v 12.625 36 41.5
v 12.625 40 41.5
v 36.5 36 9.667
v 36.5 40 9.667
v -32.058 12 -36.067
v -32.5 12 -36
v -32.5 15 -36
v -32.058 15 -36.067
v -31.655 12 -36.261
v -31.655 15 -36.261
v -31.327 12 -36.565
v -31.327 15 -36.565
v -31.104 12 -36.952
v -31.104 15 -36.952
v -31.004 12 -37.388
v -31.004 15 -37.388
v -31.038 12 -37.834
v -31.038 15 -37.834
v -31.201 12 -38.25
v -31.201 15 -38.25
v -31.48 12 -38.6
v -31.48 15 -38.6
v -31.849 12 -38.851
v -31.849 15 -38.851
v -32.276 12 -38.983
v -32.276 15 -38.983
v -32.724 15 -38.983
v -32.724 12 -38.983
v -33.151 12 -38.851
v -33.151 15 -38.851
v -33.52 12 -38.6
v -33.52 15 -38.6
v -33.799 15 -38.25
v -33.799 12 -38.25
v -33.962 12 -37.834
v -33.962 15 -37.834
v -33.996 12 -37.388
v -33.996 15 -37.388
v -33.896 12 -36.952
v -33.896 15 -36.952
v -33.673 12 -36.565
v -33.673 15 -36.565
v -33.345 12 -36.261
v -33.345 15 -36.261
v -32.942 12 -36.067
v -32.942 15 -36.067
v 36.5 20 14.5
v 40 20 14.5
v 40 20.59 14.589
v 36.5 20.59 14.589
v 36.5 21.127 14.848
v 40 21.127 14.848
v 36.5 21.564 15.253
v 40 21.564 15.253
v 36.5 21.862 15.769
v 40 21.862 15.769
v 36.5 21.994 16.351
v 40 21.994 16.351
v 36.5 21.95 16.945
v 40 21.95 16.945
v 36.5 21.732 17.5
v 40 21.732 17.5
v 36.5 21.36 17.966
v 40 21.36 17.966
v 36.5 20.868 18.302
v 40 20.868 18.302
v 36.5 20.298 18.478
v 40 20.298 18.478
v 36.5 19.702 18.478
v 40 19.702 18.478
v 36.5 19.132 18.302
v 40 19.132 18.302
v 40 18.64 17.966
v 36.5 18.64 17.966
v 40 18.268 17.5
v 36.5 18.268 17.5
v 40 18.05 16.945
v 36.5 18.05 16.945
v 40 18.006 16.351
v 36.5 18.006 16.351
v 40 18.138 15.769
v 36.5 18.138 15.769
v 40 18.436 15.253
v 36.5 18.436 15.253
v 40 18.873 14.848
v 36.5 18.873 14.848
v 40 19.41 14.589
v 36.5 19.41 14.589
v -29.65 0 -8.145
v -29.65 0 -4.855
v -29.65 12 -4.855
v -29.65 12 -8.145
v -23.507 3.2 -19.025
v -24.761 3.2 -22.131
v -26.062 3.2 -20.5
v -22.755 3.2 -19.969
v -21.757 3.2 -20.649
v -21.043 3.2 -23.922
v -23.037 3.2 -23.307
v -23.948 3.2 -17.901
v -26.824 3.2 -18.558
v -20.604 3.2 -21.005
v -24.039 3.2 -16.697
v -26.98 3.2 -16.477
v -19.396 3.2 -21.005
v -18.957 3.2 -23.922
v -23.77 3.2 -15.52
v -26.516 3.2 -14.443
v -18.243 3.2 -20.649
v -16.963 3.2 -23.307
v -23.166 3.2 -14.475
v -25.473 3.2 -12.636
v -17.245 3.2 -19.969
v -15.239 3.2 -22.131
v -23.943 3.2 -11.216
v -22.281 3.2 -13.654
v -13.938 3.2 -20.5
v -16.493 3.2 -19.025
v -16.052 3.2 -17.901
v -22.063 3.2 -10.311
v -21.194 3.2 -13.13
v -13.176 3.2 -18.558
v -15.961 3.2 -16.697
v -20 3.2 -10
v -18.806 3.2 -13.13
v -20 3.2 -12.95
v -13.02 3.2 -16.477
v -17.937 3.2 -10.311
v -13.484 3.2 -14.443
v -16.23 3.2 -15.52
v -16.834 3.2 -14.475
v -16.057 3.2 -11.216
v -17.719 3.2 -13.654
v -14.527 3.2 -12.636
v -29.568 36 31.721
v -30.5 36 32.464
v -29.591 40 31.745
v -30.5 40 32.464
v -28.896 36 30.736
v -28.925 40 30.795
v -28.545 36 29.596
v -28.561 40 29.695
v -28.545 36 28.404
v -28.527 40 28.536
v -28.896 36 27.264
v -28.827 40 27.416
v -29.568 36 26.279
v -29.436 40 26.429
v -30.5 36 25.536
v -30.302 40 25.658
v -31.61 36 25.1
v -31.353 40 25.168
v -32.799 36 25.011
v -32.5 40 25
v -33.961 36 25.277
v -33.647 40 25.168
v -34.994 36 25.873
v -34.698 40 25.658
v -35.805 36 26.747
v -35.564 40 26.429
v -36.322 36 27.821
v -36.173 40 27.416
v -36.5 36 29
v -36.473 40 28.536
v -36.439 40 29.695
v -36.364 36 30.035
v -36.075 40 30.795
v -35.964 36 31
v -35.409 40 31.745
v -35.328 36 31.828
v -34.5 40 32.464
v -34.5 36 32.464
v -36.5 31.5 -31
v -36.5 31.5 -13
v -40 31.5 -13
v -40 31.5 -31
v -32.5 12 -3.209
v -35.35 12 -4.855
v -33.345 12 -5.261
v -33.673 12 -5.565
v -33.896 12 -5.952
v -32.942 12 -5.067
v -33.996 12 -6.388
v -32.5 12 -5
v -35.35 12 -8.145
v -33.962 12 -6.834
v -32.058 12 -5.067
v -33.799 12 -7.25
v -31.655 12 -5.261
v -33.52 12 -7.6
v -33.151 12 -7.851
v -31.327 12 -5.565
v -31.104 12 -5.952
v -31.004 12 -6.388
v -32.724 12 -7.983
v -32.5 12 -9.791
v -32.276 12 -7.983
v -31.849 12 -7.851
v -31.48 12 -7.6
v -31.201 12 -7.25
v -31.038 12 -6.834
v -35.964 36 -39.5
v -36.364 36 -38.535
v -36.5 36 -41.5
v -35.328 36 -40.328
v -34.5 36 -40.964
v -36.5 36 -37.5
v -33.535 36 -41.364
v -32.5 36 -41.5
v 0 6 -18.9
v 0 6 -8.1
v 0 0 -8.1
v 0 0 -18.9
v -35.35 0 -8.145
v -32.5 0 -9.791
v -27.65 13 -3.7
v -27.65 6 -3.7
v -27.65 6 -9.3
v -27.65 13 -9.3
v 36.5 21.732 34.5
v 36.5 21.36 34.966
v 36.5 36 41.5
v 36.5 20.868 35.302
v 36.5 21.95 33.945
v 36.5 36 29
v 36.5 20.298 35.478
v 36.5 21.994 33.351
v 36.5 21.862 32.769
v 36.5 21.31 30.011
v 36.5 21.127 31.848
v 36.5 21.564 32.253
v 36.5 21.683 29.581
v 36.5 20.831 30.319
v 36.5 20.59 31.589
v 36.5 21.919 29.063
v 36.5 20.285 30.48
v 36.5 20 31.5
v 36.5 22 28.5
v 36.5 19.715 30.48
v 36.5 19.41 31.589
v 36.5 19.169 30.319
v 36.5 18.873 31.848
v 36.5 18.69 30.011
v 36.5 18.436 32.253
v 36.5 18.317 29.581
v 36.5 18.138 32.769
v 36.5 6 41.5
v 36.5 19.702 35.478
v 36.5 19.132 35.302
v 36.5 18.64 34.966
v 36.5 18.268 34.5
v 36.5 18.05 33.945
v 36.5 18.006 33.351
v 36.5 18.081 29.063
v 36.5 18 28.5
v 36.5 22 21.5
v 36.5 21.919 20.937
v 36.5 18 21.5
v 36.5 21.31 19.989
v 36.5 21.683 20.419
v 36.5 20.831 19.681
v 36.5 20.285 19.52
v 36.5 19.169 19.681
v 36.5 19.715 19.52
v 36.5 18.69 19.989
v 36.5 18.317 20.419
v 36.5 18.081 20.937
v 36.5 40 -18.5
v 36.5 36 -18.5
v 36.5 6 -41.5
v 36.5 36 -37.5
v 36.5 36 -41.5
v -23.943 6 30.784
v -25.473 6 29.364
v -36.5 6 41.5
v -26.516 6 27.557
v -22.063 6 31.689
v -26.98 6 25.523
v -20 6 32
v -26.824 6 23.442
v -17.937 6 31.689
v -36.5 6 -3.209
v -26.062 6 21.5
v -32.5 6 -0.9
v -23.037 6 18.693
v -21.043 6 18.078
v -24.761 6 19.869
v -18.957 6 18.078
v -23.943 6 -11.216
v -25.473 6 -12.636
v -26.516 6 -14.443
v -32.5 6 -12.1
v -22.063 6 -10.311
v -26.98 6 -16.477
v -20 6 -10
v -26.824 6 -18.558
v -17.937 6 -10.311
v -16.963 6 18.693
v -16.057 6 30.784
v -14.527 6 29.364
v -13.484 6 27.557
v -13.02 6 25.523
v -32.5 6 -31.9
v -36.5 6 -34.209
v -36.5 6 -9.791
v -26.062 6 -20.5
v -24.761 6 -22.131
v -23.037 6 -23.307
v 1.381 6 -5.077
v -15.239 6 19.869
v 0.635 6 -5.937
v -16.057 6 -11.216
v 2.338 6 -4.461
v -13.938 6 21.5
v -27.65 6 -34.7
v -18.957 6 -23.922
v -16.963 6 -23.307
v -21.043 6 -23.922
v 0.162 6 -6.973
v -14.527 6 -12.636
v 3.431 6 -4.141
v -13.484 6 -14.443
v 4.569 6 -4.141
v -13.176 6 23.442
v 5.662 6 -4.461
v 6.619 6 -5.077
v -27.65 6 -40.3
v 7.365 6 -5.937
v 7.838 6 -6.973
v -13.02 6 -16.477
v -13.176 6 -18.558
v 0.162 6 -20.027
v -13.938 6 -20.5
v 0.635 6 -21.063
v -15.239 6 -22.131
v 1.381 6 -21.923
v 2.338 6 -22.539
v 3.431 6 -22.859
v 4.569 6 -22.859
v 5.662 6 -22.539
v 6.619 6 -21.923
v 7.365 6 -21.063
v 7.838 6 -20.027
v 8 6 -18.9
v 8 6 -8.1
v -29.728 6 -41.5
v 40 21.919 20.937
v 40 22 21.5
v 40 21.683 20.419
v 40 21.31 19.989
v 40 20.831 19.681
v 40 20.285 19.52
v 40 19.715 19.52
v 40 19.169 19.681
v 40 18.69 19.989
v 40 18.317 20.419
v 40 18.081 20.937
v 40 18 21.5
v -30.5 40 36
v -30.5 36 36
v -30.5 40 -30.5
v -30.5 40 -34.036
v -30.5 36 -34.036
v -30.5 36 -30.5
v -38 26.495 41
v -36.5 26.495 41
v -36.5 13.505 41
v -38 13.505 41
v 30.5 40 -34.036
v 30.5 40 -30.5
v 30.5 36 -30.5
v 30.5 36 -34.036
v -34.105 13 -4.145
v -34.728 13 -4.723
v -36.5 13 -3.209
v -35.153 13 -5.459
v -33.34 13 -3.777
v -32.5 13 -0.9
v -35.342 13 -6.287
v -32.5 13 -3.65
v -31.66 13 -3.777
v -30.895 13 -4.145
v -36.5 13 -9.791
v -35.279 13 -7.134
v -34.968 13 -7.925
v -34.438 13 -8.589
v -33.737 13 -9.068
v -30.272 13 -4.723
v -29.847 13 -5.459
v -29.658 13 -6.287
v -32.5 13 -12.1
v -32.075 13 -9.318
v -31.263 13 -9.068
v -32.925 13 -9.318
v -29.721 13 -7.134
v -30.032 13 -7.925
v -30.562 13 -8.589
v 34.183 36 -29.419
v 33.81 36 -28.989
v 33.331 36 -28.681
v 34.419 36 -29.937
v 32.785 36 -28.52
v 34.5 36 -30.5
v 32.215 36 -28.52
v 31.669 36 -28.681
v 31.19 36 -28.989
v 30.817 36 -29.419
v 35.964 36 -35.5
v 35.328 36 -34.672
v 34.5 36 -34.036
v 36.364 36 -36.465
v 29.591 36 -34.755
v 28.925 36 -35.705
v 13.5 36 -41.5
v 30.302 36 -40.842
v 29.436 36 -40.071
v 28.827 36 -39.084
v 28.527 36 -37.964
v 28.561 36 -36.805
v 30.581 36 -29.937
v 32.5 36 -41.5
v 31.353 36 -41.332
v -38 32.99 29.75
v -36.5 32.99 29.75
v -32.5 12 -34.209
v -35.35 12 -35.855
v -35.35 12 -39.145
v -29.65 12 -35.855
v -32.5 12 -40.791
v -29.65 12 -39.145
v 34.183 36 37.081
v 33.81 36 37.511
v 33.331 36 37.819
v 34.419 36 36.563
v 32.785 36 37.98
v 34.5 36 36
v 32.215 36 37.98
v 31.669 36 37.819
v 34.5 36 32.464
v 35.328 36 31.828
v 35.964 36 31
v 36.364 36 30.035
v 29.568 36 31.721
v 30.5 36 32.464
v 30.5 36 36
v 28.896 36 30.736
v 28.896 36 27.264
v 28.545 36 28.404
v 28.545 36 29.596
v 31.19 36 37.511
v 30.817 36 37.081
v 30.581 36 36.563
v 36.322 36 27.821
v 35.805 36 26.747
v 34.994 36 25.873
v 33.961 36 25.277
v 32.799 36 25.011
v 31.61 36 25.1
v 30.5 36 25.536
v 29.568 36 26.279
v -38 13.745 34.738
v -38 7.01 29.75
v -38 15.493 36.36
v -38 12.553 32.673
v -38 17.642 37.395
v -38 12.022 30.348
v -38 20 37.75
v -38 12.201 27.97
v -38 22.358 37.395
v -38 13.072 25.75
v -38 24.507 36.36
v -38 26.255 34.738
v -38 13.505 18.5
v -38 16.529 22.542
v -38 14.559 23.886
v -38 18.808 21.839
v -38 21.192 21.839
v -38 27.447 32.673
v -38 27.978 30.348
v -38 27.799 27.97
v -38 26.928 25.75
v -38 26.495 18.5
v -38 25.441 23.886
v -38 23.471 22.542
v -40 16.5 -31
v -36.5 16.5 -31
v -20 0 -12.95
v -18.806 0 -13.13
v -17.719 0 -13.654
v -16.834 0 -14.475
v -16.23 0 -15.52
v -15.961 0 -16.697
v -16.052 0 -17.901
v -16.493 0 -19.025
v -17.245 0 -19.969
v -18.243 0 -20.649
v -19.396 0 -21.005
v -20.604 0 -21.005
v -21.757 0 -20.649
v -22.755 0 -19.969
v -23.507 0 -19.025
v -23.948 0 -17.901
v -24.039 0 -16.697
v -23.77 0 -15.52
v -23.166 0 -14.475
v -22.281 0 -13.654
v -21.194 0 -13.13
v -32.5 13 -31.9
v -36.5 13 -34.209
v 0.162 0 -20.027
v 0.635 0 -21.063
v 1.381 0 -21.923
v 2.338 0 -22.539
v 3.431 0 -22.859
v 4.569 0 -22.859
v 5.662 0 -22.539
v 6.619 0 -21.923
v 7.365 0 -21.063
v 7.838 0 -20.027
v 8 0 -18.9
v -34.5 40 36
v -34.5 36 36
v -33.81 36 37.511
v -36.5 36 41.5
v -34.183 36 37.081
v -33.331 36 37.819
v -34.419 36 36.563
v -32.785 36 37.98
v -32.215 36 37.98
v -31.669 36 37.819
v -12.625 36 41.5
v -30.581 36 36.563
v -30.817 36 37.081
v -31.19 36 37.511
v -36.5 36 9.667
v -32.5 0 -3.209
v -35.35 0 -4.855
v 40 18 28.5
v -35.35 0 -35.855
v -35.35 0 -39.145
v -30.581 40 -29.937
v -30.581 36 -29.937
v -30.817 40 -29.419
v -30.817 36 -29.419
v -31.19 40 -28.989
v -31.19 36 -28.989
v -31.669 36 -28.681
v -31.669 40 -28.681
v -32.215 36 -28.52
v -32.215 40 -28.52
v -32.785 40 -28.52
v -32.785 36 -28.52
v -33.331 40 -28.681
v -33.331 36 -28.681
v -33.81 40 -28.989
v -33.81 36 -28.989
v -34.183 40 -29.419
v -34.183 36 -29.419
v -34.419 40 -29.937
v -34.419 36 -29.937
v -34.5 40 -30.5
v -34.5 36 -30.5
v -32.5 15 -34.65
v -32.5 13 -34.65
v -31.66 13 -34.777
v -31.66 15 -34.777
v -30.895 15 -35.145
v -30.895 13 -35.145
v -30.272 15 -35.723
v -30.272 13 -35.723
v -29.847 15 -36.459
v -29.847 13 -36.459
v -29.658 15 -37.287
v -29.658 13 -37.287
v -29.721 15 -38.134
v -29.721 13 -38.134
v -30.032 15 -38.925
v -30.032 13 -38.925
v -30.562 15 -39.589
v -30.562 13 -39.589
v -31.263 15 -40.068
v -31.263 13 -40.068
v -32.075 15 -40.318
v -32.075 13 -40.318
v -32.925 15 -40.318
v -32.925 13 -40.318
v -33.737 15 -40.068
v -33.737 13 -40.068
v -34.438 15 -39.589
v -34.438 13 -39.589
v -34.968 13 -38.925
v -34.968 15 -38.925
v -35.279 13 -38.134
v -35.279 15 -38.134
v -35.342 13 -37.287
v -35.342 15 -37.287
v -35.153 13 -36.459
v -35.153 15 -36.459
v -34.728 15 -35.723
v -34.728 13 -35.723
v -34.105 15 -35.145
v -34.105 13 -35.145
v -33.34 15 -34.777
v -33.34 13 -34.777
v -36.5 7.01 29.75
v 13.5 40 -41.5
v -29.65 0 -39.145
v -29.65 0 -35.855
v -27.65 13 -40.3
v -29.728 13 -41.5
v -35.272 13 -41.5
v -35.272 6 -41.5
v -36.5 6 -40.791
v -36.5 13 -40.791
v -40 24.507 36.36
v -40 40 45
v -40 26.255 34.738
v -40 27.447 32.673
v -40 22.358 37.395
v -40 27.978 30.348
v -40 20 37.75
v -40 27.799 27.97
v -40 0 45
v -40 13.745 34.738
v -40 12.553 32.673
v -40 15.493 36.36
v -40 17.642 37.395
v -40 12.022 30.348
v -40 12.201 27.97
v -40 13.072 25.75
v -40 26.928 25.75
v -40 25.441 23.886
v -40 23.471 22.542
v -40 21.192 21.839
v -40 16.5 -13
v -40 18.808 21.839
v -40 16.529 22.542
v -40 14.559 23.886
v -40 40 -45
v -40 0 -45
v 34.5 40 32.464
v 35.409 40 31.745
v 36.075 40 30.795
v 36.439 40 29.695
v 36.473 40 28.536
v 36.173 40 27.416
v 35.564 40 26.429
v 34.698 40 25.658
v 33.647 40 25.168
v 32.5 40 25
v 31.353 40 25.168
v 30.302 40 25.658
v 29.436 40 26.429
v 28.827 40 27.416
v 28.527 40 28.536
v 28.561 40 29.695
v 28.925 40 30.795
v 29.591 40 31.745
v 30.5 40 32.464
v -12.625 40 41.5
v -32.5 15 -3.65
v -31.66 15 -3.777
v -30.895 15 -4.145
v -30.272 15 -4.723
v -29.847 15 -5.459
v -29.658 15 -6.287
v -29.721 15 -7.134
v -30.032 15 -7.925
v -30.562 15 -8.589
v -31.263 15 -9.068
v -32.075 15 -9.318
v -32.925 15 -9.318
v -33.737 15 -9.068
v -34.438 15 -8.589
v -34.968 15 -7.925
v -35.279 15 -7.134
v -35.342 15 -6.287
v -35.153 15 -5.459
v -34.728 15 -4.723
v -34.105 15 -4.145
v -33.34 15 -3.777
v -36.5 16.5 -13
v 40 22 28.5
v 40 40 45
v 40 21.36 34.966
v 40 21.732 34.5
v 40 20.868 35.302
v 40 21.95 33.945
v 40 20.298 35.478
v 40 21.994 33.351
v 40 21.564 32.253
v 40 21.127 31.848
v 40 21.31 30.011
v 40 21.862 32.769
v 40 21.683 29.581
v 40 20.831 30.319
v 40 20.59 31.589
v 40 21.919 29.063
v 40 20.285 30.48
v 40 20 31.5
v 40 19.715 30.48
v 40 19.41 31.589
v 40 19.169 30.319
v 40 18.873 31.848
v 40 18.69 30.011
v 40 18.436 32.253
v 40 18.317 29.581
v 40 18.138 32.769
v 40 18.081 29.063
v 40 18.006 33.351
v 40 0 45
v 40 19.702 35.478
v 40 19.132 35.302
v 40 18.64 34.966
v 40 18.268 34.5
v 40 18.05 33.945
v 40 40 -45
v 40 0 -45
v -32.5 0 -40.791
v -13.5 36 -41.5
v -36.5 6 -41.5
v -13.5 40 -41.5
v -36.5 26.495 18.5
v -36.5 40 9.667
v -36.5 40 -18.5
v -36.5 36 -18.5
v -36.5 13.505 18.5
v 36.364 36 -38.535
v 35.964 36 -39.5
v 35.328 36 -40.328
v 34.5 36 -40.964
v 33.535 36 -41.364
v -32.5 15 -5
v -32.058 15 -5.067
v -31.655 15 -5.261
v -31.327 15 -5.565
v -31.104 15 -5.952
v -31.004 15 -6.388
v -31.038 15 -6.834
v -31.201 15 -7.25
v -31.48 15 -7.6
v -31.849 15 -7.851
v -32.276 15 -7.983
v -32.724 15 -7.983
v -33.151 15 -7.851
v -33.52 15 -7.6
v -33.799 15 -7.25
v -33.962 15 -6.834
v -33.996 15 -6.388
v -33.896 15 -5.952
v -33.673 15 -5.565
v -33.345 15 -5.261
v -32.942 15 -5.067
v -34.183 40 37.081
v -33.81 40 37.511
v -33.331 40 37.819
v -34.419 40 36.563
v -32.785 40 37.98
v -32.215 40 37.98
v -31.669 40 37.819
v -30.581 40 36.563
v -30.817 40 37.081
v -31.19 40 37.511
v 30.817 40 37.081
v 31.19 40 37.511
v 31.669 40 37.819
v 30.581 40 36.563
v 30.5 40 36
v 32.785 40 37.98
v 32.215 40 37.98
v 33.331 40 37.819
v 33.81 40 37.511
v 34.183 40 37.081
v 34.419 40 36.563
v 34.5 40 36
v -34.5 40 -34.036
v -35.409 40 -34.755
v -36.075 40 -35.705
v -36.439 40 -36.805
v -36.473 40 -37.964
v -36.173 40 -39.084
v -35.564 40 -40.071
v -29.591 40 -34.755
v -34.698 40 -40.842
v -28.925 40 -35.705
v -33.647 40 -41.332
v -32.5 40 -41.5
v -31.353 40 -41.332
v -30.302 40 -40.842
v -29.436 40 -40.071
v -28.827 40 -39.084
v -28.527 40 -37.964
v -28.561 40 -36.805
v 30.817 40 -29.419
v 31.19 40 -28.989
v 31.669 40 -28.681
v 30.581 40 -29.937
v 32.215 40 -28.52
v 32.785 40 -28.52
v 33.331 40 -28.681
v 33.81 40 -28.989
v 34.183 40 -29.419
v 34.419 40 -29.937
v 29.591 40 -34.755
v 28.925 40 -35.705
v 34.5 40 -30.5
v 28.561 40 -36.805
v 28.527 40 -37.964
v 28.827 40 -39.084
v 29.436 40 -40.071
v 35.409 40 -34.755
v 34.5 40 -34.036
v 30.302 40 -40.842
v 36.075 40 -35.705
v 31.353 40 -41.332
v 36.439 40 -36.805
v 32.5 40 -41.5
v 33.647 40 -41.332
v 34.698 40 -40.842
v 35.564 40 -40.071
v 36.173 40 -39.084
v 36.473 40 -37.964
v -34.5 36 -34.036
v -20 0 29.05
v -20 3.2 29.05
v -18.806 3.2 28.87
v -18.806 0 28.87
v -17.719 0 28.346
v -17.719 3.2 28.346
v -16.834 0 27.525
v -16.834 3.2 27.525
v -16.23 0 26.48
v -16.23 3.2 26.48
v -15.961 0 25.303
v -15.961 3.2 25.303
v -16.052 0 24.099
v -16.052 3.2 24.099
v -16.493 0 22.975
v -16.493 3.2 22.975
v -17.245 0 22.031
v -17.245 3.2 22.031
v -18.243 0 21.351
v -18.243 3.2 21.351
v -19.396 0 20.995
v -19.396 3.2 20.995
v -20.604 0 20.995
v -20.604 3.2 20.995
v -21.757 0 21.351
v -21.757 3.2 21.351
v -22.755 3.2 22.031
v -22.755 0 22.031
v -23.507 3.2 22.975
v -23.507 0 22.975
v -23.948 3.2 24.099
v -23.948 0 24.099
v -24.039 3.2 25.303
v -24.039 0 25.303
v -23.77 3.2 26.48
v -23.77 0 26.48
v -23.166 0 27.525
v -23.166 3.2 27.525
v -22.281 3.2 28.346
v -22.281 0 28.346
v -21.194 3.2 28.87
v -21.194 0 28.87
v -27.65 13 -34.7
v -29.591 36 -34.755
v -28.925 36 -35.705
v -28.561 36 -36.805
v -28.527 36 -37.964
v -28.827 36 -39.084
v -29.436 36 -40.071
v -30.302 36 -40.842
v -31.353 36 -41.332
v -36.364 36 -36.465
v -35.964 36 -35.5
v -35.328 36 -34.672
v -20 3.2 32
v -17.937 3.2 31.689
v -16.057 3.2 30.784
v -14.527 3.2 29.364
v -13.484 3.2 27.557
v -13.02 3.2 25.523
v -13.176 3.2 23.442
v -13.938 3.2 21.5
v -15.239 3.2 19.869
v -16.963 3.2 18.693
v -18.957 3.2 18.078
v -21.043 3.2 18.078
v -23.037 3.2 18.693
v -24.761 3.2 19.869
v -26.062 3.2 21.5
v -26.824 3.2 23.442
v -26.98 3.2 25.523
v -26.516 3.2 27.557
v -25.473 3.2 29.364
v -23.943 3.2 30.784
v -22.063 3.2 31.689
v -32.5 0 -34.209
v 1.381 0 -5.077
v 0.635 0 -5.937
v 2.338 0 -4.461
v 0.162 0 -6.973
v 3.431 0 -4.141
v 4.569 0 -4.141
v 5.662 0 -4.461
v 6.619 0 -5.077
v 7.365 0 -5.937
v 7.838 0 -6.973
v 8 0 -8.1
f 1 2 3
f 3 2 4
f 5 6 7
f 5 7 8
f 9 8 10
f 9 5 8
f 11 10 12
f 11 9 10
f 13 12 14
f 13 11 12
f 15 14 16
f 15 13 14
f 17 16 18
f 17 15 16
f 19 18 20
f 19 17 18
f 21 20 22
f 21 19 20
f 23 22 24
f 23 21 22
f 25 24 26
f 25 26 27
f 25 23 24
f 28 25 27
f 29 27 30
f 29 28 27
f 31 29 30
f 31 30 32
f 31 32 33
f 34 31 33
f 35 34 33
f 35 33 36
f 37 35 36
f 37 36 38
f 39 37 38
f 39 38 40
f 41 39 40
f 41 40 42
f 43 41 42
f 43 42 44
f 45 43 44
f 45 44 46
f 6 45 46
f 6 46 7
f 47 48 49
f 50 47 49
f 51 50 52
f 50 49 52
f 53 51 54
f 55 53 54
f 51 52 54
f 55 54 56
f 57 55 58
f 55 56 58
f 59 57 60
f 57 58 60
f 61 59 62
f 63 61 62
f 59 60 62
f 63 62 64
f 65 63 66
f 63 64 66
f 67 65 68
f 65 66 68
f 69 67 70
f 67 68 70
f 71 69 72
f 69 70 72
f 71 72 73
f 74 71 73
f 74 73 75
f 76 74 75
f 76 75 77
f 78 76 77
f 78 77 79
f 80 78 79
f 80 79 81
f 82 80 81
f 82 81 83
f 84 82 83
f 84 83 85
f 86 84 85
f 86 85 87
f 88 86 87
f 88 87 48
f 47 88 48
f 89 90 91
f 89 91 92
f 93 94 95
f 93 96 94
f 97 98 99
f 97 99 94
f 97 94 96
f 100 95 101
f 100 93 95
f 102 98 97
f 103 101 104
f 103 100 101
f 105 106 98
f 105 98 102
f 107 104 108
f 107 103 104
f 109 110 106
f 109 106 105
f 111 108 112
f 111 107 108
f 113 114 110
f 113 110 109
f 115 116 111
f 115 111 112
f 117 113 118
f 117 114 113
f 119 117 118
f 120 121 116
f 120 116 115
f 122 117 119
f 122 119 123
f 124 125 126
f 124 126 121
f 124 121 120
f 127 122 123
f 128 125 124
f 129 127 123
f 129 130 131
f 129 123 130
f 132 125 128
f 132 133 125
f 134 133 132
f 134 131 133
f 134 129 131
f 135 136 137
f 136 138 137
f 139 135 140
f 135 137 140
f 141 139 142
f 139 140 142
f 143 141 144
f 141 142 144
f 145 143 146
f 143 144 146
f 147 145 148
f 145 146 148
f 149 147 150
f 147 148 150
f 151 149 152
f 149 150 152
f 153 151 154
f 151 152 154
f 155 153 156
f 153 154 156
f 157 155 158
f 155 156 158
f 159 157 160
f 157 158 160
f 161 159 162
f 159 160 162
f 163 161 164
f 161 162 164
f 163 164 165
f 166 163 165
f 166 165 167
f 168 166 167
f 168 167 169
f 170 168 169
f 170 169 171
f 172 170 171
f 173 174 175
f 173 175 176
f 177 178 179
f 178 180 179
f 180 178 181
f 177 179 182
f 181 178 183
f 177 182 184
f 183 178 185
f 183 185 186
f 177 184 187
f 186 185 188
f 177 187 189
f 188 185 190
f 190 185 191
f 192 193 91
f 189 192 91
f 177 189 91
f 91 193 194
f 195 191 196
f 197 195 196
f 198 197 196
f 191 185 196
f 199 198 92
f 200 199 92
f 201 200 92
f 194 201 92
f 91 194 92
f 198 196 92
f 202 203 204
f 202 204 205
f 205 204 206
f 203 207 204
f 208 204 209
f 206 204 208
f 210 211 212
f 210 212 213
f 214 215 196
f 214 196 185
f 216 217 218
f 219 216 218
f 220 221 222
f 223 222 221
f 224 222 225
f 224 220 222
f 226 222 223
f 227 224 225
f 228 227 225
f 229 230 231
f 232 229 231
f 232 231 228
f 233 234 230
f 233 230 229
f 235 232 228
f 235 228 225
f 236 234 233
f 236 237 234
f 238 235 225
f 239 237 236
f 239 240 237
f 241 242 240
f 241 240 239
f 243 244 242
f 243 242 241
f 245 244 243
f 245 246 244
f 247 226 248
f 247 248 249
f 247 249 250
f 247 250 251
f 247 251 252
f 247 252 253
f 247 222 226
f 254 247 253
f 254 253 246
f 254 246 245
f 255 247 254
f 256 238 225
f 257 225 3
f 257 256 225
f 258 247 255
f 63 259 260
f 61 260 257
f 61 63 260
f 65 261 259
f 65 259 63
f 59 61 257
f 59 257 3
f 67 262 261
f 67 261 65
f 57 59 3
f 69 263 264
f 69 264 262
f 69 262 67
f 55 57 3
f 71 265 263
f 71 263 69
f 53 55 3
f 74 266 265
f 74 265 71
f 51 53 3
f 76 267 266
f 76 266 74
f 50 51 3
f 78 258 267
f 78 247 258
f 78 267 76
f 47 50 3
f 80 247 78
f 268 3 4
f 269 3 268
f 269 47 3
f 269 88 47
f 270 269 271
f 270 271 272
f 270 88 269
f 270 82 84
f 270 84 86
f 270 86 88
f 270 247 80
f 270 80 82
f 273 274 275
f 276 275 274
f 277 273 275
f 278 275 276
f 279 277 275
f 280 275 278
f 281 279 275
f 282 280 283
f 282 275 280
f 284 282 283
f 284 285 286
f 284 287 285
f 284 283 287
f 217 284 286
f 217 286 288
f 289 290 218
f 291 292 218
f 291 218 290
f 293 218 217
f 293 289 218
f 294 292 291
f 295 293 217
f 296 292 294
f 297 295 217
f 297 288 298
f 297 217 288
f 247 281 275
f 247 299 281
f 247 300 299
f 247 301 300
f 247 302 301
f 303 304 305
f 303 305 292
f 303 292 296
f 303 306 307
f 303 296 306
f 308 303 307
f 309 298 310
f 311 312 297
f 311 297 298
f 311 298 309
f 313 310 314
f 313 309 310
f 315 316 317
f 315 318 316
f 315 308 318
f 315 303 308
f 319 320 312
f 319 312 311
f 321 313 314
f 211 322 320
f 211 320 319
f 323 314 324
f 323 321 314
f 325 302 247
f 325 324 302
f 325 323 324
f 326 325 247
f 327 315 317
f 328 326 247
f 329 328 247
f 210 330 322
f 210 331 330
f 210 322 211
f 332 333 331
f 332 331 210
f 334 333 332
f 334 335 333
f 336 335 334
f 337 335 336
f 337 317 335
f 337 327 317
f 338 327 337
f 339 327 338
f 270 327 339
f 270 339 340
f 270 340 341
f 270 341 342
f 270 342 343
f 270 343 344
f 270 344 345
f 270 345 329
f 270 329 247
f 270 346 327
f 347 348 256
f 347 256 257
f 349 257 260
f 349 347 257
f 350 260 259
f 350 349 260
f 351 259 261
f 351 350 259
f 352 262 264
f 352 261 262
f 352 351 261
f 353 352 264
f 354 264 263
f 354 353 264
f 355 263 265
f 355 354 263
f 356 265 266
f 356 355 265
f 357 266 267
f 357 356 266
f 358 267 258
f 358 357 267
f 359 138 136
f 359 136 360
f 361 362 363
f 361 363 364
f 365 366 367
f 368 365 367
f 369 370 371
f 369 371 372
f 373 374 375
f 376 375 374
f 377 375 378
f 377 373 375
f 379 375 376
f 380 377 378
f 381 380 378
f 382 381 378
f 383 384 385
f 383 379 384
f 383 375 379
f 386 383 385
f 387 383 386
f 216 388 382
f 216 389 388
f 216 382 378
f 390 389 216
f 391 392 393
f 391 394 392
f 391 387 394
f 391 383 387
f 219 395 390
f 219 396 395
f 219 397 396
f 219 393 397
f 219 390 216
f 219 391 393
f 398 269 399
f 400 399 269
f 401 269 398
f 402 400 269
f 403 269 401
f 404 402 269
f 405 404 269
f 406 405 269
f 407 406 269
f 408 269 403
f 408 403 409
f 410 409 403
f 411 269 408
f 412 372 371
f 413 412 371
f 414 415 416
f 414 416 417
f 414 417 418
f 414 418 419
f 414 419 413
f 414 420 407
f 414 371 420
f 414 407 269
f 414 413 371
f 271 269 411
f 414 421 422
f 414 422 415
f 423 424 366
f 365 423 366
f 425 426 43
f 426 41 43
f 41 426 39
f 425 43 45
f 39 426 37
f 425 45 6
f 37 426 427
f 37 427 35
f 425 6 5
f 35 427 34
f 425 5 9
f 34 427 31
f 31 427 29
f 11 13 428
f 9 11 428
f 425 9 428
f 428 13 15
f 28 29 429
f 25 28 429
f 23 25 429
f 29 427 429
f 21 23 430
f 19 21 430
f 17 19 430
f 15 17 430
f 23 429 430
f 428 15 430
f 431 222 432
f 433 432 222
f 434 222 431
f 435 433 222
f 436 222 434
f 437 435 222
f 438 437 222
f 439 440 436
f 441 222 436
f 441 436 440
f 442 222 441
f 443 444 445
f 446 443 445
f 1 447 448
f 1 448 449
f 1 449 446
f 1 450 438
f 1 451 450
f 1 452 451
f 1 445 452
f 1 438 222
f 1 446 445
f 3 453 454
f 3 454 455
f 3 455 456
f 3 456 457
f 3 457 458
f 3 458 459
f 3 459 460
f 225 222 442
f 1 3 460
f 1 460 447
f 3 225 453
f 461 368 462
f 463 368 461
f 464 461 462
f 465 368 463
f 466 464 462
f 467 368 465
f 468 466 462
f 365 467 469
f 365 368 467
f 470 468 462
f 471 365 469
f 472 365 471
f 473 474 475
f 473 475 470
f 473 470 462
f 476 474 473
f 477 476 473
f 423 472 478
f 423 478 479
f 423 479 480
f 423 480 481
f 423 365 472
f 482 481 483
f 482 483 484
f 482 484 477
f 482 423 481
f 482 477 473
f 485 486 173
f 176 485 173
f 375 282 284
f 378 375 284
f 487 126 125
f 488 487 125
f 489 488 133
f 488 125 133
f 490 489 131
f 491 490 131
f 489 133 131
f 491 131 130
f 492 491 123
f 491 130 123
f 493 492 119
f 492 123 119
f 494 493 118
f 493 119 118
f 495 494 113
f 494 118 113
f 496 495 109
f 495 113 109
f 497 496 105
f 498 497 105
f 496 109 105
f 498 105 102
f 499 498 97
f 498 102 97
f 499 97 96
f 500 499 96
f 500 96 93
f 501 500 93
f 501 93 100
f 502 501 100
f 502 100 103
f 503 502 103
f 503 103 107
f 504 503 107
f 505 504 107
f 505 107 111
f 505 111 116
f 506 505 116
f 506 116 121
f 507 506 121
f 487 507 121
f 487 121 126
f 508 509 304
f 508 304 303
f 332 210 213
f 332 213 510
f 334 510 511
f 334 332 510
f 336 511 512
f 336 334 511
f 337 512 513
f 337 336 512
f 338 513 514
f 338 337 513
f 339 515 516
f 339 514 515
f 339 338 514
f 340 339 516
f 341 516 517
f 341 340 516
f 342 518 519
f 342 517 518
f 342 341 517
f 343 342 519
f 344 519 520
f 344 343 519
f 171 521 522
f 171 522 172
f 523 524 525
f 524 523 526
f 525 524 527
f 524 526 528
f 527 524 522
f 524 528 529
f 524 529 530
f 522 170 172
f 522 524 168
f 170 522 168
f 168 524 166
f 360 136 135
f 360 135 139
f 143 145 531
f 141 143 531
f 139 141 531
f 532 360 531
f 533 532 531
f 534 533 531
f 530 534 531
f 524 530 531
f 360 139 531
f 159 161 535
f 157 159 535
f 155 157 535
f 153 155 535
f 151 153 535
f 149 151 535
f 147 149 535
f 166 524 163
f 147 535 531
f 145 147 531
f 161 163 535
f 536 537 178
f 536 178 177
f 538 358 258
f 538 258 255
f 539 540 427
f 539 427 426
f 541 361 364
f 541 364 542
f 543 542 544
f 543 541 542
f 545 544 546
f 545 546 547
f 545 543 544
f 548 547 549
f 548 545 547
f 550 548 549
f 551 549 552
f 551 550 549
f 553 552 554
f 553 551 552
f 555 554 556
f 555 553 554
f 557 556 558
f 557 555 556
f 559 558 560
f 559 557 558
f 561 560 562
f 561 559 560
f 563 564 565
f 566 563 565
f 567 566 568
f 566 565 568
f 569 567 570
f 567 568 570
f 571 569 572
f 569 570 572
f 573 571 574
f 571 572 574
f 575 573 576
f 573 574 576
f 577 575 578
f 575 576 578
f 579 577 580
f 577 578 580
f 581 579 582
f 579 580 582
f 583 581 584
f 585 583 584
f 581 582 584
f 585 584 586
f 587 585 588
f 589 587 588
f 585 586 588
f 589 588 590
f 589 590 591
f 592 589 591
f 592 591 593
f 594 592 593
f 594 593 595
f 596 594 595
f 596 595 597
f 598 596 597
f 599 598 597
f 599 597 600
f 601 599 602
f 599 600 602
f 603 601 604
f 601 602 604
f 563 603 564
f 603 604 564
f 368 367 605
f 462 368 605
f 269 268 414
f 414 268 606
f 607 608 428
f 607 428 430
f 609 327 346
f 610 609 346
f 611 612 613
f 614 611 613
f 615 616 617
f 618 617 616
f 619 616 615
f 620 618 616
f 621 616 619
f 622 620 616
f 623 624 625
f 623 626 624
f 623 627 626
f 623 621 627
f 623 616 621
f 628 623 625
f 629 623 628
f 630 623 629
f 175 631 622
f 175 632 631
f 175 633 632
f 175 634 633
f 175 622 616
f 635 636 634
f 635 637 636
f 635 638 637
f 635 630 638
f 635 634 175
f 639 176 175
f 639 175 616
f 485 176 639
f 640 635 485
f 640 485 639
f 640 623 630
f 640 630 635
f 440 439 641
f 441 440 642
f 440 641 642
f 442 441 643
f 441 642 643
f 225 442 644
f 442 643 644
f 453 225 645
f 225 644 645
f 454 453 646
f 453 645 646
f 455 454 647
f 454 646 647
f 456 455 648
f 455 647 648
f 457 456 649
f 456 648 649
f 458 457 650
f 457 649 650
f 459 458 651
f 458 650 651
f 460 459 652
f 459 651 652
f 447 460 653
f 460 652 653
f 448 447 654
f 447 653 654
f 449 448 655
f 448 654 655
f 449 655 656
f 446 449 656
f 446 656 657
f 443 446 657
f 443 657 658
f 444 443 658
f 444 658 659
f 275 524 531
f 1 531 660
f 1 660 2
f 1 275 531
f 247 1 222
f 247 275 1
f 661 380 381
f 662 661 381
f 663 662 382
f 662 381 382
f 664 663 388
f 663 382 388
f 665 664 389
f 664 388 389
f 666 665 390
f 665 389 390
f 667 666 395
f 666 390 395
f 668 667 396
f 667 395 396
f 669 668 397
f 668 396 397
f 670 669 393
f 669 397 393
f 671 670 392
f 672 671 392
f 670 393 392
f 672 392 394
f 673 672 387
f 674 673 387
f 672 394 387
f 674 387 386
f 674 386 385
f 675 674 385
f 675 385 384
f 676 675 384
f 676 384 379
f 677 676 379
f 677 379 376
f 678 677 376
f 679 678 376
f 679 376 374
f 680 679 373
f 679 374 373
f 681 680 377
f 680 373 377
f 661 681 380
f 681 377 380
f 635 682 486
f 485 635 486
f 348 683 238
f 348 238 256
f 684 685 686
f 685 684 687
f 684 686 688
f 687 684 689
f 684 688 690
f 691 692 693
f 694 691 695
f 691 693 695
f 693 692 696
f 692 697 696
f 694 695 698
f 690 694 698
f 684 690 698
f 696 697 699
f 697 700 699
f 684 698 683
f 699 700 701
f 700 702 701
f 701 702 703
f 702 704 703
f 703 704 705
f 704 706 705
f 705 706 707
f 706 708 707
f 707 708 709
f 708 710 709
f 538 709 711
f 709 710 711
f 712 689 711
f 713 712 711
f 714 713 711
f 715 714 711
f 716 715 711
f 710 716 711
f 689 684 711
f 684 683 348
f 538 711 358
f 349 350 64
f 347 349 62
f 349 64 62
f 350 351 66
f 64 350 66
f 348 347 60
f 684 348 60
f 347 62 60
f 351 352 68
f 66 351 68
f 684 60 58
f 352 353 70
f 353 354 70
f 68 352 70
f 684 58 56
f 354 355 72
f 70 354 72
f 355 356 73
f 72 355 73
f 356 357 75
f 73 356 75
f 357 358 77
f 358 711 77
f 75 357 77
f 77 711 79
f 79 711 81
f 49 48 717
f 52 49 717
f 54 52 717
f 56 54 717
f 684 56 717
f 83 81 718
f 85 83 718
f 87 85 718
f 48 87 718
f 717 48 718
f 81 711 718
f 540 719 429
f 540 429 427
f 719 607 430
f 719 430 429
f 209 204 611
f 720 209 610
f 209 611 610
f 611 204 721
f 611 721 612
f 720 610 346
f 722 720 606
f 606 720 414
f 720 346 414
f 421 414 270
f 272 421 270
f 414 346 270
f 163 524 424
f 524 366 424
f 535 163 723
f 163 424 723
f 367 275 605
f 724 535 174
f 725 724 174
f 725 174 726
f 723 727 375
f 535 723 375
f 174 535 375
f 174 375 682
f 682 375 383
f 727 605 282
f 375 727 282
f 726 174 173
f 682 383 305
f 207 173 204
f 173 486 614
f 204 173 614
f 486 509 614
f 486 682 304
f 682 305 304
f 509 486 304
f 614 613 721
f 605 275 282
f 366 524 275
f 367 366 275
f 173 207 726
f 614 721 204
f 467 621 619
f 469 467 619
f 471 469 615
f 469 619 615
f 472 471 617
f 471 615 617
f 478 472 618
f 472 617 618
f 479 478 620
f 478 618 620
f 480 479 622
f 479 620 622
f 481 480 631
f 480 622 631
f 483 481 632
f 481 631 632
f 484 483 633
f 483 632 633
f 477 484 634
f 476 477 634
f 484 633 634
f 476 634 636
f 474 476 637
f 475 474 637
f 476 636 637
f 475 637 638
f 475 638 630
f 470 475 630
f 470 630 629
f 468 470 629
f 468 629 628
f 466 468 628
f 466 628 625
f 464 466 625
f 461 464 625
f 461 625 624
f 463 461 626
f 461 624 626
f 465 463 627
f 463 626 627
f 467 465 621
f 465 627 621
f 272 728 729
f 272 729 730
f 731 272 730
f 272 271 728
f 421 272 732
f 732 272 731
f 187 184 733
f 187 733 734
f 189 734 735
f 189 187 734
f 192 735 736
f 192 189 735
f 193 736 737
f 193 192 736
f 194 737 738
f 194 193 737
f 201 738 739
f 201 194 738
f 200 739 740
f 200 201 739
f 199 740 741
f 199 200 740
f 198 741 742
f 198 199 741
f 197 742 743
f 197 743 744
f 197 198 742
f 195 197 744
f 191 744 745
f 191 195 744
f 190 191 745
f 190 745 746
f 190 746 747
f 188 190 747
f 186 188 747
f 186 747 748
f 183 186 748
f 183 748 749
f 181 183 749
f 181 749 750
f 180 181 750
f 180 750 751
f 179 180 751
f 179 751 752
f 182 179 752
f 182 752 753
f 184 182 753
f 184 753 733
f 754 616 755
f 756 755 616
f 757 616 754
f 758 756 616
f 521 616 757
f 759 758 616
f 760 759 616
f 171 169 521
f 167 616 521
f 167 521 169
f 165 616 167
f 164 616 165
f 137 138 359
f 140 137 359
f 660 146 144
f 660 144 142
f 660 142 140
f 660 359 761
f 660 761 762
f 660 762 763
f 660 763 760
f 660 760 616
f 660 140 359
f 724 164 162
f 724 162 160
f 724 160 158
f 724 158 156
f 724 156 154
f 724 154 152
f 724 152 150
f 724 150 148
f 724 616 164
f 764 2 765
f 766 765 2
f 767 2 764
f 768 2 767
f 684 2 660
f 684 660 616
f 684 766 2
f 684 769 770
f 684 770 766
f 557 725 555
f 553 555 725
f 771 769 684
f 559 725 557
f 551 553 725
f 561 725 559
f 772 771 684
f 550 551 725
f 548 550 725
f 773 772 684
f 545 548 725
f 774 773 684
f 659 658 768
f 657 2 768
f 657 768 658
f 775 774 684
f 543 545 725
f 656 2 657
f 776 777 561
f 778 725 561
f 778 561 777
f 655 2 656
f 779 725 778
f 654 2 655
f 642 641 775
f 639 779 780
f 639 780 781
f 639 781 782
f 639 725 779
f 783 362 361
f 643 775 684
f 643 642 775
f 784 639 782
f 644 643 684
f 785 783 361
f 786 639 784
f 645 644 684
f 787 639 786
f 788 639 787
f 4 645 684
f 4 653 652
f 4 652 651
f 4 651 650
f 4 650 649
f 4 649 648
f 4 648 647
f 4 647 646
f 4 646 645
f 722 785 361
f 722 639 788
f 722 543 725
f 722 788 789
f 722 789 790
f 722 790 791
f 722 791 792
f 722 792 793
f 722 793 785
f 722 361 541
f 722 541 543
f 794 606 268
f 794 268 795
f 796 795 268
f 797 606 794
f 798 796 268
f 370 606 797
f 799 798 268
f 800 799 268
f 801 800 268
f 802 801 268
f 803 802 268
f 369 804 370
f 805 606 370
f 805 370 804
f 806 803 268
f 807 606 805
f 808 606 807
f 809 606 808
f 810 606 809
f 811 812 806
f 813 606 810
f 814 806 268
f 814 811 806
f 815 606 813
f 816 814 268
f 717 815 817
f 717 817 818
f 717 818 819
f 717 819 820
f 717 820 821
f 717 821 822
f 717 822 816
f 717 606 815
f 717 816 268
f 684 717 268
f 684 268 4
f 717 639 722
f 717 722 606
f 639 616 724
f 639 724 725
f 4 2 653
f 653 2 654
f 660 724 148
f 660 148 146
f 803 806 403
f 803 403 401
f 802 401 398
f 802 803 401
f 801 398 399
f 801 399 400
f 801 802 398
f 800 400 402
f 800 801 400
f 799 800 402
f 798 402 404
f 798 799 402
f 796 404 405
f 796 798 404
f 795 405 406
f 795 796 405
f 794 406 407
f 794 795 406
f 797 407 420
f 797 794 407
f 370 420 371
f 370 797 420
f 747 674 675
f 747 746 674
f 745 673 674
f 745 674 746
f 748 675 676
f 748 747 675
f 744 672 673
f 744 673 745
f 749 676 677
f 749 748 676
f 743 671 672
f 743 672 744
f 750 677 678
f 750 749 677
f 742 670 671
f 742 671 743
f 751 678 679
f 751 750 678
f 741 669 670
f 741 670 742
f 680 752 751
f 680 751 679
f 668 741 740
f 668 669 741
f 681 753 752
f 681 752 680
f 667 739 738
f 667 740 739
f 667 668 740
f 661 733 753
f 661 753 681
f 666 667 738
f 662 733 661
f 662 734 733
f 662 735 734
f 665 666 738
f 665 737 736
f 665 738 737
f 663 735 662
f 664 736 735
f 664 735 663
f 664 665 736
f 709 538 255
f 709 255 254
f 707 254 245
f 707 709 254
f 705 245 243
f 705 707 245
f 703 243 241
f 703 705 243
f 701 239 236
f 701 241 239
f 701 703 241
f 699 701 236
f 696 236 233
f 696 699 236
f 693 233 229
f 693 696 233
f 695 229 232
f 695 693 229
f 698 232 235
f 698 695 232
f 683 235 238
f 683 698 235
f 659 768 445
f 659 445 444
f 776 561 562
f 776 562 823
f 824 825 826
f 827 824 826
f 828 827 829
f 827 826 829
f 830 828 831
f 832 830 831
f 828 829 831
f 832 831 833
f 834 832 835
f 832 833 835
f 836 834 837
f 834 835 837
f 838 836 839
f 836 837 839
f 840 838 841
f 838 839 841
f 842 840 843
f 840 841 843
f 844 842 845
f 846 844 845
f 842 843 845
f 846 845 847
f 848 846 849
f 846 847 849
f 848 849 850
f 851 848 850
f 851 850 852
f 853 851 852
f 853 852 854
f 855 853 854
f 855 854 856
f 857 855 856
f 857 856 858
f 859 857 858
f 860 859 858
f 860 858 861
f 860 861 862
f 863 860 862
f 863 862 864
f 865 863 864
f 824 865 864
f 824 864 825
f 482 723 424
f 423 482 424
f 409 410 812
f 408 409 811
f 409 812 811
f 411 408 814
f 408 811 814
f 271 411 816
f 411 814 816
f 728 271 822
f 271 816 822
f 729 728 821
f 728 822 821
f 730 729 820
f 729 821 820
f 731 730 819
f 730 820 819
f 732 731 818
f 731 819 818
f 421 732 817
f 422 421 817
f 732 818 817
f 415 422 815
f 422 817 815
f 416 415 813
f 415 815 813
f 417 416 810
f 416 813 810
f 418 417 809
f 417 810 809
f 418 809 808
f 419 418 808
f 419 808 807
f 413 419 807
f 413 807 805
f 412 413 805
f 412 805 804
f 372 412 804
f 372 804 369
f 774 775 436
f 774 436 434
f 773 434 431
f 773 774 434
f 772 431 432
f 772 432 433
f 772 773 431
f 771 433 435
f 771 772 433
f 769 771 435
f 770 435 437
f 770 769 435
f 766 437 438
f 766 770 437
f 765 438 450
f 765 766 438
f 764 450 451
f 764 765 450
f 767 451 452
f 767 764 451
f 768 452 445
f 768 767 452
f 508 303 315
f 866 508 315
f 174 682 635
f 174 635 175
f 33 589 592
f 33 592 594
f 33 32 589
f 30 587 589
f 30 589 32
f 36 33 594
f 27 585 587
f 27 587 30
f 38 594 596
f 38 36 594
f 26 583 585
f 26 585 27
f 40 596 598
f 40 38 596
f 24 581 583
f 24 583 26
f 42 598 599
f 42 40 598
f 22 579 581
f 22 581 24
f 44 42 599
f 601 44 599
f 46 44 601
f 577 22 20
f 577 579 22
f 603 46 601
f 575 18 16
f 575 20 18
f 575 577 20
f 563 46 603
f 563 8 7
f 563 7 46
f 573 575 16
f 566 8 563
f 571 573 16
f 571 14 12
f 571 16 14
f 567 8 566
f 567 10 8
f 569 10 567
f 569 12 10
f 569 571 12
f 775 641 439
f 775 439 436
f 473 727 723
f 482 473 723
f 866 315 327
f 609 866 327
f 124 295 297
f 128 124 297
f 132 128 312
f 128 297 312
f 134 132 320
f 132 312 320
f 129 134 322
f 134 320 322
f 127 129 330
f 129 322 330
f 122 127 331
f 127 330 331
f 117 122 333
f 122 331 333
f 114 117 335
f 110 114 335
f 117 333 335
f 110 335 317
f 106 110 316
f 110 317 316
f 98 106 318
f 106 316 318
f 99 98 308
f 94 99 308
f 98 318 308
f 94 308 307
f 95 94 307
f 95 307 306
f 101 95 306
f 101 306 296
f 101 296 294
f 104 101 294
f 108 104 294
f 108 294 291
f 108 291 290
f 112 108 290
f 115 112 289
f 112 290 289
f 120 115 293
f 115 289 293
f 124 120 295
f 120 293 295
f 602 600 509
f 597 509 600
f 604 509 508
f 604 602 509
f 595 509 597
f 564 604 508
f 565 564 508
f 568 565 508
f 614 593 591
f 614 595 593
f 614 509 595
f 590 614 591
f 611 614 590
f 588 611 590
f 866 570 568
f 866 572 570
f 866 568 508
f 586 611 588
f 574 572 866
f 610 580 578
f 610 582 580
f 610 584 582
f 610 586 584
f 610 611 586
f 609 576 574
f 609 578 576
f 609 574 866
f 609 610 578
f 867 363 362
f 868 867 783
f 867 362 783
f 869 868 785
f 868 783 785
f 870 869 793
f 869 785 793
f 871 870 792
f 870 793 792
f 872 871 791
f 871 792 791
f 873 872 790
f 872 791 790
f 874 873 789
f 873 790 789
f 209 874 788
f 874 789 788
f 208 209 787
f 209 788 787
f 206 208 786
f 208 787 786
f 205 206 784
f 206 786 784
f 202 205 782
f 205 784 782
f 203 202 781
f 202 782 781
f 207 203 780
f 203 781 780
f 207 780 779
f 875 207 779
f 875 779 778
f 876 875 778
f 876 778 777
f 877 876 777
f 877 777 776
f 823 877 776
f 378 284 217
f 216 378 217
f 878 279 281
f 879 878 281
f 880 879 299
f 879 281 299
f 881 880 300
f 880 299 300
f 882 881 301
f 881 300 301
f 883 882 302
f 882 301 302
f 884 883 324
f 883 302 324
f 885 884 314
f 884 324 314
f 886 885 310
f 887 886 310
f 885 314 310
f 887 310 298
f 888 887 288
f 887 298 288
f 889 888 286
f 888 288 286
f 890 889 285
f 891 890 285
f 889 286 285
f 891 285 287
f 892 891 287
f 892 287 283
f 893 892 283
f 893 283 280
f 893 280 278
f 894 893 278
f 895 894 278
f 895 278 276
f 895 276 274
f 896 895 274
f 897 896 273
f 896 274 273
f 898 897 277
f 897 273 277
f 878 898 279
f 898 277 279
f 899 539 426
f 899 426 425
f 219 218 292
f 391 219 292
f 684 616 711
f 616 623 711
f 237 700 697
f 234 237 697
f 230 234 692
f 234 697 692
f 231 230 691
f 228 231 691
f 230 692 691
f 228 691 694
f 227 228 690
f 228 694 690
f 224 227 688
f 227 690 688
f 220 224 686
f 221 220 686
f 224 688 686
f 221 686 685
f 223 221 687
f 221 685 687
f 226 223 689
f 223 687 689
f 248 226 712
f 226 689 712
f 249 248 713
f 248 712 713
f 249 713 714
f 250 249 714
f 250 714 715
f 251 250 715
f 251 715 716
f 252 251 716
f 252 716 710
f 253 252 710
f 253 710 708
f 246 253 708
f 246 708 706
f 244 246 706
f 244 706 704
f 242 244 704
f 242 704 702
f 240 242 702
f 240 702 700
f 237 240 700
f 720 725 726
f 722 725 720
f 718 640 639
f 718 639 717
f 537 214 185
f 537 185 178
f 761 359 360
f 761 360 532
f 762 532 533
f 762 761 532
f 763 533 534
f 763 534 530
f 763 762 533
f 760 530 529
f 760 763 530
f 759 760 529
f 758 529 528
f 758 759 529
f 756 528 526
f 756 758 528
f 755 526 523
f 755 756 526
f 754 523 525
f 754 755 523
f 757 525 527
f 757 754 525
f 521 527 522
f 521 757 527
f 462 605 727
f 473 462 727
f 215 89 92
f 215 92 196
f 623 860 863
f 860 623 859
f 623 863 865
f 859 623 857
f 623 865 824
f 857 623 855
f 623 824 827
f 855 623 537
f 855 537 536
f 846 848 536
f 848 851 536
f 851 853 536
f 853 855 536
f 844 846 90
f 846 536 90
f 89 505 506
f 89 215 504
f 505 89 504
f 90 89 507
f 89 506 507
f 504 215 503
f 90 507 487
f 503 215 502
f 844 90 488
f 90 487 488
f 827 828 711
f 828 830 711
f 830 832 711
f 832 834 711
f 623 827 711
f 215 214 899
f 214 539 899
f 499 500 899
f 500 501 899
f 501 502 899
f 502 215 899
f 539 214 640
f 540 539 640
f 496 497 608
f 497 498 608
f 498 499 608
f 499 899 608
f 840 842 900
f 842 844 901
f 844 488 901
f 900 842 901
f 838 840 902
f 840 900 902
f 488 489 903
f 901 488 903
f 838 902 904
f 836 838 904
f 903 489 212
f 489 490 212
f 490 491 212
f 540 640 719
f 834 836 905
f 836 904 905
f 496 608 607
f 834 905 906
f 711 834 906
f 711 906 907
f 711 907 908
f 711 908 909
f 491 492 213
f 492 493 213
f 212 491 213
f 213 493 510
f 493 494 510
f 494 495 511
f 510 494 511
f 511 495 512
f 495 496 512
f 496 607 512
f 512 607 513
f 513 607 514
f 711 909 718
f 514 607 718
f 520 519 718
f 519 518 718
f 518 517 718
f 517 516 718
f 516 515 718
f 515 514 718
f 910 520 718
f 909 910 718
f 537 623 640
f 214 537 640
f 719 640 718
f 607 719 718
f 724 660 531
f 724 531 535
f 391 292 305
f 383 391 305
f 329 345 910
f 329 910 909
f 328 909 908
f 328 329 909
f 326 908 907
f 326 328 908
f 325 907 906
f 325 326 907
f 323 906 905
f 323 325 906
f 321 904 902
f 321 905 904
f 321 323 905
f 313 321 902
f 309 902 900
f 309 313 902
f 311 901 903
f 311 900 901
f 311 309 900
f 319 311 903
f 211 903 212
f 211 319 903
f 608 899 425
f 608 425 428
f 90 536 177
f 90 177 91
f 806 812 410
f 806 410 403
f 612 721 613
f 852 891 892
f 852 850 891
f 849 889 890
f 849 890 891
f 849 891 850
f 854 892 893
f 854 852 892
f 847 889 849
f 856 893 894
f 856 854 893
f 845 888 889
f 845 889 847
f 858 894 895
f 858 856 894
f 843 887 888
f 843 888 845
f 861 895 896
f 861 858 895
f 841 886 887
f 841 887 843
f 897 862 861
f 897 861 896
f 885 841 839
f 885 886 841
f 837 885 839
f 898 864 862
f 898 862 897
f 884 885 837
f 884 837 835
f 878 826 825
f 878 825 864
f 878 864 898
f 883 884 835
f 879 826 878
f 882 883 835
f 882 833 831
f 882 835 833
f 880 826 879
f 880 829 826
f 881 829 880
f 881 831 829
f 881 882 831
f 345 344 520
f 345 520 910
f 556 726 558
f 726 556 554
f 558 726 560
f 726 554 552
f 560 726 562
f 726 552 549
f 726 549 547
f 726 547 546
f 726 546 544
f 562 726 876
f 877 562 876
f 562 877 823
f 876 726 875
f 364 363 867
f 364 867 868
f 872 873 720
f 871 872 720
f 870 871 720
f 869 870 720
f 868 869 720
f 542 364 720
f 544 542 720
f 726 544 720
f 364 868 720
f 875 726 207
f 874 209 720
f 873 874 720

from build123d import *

# Parameters (mm, degrees)
SKETCH1_W               = 80
SKETCH1_H               = 90
BOSS_EXTRUDE1_DEPTH     = 6
SKETCH4_W               = 80
SKETCH4_H               = 90
SKETCH4_W_2             = 73
SKETCH4_H_2             = 83
BOSS_EXTRUDE2_DEPTH     = 34
SKETCH6_R               = 4.05
CUT_EXTRUDE1_DEPTH      = 40
SKETCH7_R               = 7
CUT_EXTRUDE2_DEPTH      = 2.8
BOSS_EXTRUDE3_DEPTH     = 7
SKETCH11_R              = 2.85
BOSS_EXTRUDE4_DEPTH     = 2
CUT_EXTRUDE3_DEPTH      = 9
CUT_EXTRUDE3_DEPTH_BACK = 6
SKETCH5_R               = 1.5
CUT_EXTRUDE4_DEPTH      = 6
CUT_EXTRUDE4_DEPTH_BACK = 70.144775652
SKETCH12_W              = 18
SKETCH12_H              = 15
CUT_EXTRUDE6_DEPTH      = 3.5
SKETCH17_R              = 8
CUT_EXTRUDE8_DEPTH      = 2
CUT_EXTRUDE9_DEPTH      = 1.5
CUT_EXTRUDE14_DEPTH     = 10
SKETCH30_R              = 2
CUT_EXTRUDE15_DEPTH     = 10
BOSS_EXTRUDE6_DEPTH     = 4
CUT_EXTRUDE12_DEPTH     = 4
SKETCH26_R              = 4
CUT_EXTRUDE13_DEPTH     = 4


with BuildPart() as part:
    # Sketch1 → Boss-Extrude1 (new body)
    with BuildSketch(Plane(origin=(0, 0, 0), x_dir=(1, 0, 0), z_dir=(0, 1, 0))):
        Rectangle(SKETCH1_W, SKETCH1_H)
    extrude(amount=BOSS_EXTRUDE1_DEPTH)

    # Sketch4 → Boss-Extrude2 (add)
    with BuildSketch(Plane(origin=(0, 6, 0), x_dir=(1, 0, 0), z_dir=(0, 1, 0))):
        Rectangle(SKETCH4_W, SKETCH4_H)
        Rectangle(SKETCH4_W_2, SKETCH4_H_2, mode=Mode.SUBTRACT)
    extrude(amount=BOSS_EXTRUDE2_DEPTH)

    # Sketch6 → Cut-Extrude1 (cut)
    with BuildSketch(Plane(origin=(0, 6, 0), x_dir=(1, 0, 0), z_dir=(0, 1, 0))):
        with Locations(Location((-20, 17, 0), (0, 0, 270))):
            Circle(SKETCH6_R)
        with Locations(Location((-20, -25, 0), (0, 0, 270))):
            Circle(SKETCH6_R)
    extrude(amount=-CUT_EXTRUDE1_DEPTH, mode=Mode.SUBTRACT)

    # Sketch7 → Cut-Extrude2 (cut)
    with BuildSketch(Plane(origin=(0, 6, 0), x_dir=(1, 0, 0), z_dir=(0, 1, 0))):
        with Locations(Location((-20, 17, 0), (0, 0, 270))):
            Circle(SKETCH7_R)
        with Locations(Location((-20, -25, 0), (0, 0, 270))):
            Circle(SKETCH7_R)
    extrude(amount=-CUT_EXTRUDE2_DEPTH, mode=Mode.SUBTRACT)

    # Sketch10 → Boss-Extrude3 (add)
    with BuildSketch(Plane(origin=(0, 6, 0), x_dir=(1, 0, 0), z_dir=(0, 1, 0))):
        Polygon((-32.5, 43.100297611), (-37.35, 40.300148806), (-37.35, 34.699851194), (-32.5, 31.899702389), (-27.65, 34.699851194), (-27.65, 40.300148806), align=None)
        Polygon((-27.65, 9.300148806), (-32.5, 12.100297611), (-37.35, 9.300148806), (-37.35, 3.699851194), (-32.5, 0.899702389), (-27.65, 3.699851194), align=None)
    extrude(amount=BOSS_EXTRUDE3_DEPTH)

    # Sketch11 → Boss-Extrude4 (add)
    with BuildSketch(Plane(origin=(0, 13, 0), x_dir=(1, 0, 0), z_dir=(0, 1, 0))):
        with Locations(Location((-32.5, 37.5, 0), (0, 0, 270))):
            Circle(SKETCH11_R)
        with Locations(Location((-32.5, 6.5, 0), (0, 0, 270))):
            Circle(SKETCH11_R)
    extrude(amount=BOSS_EXTRUDE4_DEPTH)

    # Sketch5 → Cut-Extrude3 (cut, two sides: drawn at the far end of the back side and taken through both)
    with BuildSketch(Plane(origin=(0, 6, 0), x_dir=(1, 0, 0), z_dir=(0, 1, 0)).offset(-CUT_EXTRUDE3_DEPTH_BACK)):
        with Locations(Location((-32.5, 37.5, 0), (0, 0, 270))):
            Circle(SKETCH5_R)
        with Locations(Location((-32.5, 6.5, 0), (0, 0, 270))):
            Circle(SKETCH5_R)
    extrude(amount=CUT_EXTRUDE3_DEPTH + CUT_EXTRUDE3_DEPTH_BACK, mode=Mode.SUBTRACT)

    # Sketch8 → Cut-Extrude4 (cut, two sides: drawn at the far end of the back side and taken through both)
    with BuildSketch(Plane(origin=(0, 6, 0), x_dir=(1, 0, 0), z_dir=(0, 1, 0)).offset(-CUT_EXTRUDE4_DEPTH_BACK)):
        Polygon((-29.65, 39.145448267), (-32.5, 40.790896534), (-35.35, 39.145448267), (-35.35, 35.854551733), (-32.5, 34.209103466), (-29.65, 35.854551733), align=None)
        Polygon((-29.65, 8.145448267), (-32.5, 9.790896534), (-35.35, 8.145448267), (-35.35, 4.854551733), (-32.5, 3.209103466), (-29.65, 4.854551733), align=None)
    extrude(amount=CUT_EXTRUDE4_DEPTH + CUT_EXTRUDE4_DEPTH_BACK, mode=Mode.SUBTRACT)

    # Sketch12 → Cut-Extrude6 (cut)
    with BuildSketch(Plane(origin=(-36.5, 0, 0), x_dir=(0, 0, -1), z_dir=(1, 0, 0))):
        with Locations((22, 24)):
            Rectangle(SKETCH12_W, SKETCH12_H)
    extrude(amount=-CUT_EXTRUDE6_DEPTH, mode=Mode.SUBTRACT)

    # Sketch17 → Cut-Extrude8 (cut)
    with BuildSketch(Plane.ZY.offset(40)):
        with Locations((29.75, 20)):
            Circle(SKETCH17_R)
    extrude(amount=-CUT_EXTRUDE8_DEPTH, mode=Mode.SUBTRACT)

    # Sketch15 → Cut-Extrude9 (cut)
    with BuildSketch(Plane(origin=(-36.5, 0, 0), x_dir=(0, 0, -1), z_dir=(1, 0, 0))):
        Polygon((-29.75, 32.990381057), (-41, 26.495190528), (-41, 13.504809472), (-29.75, 7.009618943), (-18.5, 13.504809472), (-18.5, 26.495190528), align=None)
    extrude(amount=-CUT_EXTRUDE9_DEPTH, mode=Mode.SUBTRACT)

    # Sketch29 → Cut-Extrude14 (cut)
    with BuildSketch(Plane(origin=(0, 6, 0), x_dir=(1, 0, 0), z_dir=(0, 1, 0))):
        with BuildLine():
            Line((8, 18.9), (8, 8.1))
            ThreePointArc((8, 8.1), (4, 4.1), (0, 8.1))
            Line((0, 8.1), (0, 18.9))
            ThreePointArc((0, 18.9), (4, 22.9), (8, 18.9))
        make_face()
    extrude(amount=-CUT_EXTRUDE14_DEPTH, mode=Mode.SUBTRACT)

    # Sketch30 → Cut-Extrude15 (cut)
    with BuildSketch(Plane(origin=(40, 0, 0), x_dir=(0, 0, -1), z_dir=(1, 0, 0))):
        with Locations((-33.5, 20)):
            Circle(SKETCH30_R)
        with Locations((-16.5, 20)):
            Circle(SKETCH30_R)
        with BuildLine():
            Line((-28.5, 22), (-21.5, 22))
            ThreePointArc((-21.5, 22), (-19.5, 20), (-21.5, 18))
            Line((-21.5, 18), (-28.5, 18))
            ThreePointArc((-28.5, 18), (-30.5, 20), (-28.5, 22))
        make_face()
    extrude(amount=-CUT_EXTRUDE15_DEPTH, mode=Mode.SUBTRACT)

    # Sketch23 → Boss-Extrude6 (add)
    with BuildSketch(Plane(origin=(0, 40, 0), x_dir=(1, 0, 0), z_dir=(0, 1, 0))):
        Polygon((-10, -45), (-40, -5), (-40, -45), align=None)
        Polygon((40, -45), (10, -45), (40, -5), align=None)
        Polygon((-40, 45), (-40, 15), (-10, 45), align=None)
        Polygon((10, 45), (40, 45), (40, 15), align=None)
    extrude(amount=-BOSS_EXTRUDE6_DEPTH)

    # Sketch27 → Cut-Extrude12 (cut)
    with BuildSketch(Plane(origin=(0, 40, 0), x_dir=(1, 0, 0), z_dir=(0, 1, 0))):
        with BuildLine():
            Line((-30.5, 37.5), (-30.5, 30.5))
            ThreePointArc((-30.5, 30.5), (-32.5, 28.5), (-34.5, 30.5))
            Line((-34.5, 30.5), (-34.5, 37.5))
            ThreePointArc((-34.5, 37.5), (-32.5, 39.5), (-30.5, 37.5))
        make_face()
        with BuildLine():
            Line((34.5, 37.5), (34.5, 30.5))
            ThreePointArc((34.5, 30.5), (32.5, 28.5), (30.5, 30.5))
            Line((30.5, 30.5), (30.5, 37.5))
            ThreePointArc((30.5, 37.5), (32.5, 39.5), (34.5, 37.5))
        make_face()
        with BuildLine():
            Line((34.5, -29), (34.5, -36))
            ThreePointArc((34.5, -36), (32.5, -38), (30.5, -36))
            Line((30.5, -36), (30.5, -29))
            ThreePointArc((30.5, -29), (32.5, -27), (34.5, -29))
        make_face()
        with BuildLine():
            Line((-30.5, -29), (-30.5, -36))
            ThreePointArc((-30.5, -36), (-32.5, -38), (-34.5, -36))
            Line((-34.5, -36), (-34.5, -29))
            ThreePointArc((-34.5, -29), (-32.5, -27), (-30.5, -29))
        make_face()
    extrude(amount=-CUT_EXTRUDE12_DEPTH, mode=Mode.SUBTRACT)

    # Sketch26 → Cut-Extrude13 (cut)
    with BuildSketch(Plane(origin=(0, 40, 0), x_dir=(1, 0, 0), z_dir=(0, 1, 0))):
        with Locations((-32.5, 37.5)):
            Circle(SKETCH26_R)
        with Locations((32.5, 37.5)):
            Circle(SKETCH26_R)
        with Locations((32.5, -29)):
            Circle(SKETCH26_R)
        with Locations((-32.5, -29)):
            Circle(SKETCH26_R)
    extrude(amount=-CUT_EXTRUDE13_DEPTH, mode=Mode.SUBTRACT)


solid = part.part
